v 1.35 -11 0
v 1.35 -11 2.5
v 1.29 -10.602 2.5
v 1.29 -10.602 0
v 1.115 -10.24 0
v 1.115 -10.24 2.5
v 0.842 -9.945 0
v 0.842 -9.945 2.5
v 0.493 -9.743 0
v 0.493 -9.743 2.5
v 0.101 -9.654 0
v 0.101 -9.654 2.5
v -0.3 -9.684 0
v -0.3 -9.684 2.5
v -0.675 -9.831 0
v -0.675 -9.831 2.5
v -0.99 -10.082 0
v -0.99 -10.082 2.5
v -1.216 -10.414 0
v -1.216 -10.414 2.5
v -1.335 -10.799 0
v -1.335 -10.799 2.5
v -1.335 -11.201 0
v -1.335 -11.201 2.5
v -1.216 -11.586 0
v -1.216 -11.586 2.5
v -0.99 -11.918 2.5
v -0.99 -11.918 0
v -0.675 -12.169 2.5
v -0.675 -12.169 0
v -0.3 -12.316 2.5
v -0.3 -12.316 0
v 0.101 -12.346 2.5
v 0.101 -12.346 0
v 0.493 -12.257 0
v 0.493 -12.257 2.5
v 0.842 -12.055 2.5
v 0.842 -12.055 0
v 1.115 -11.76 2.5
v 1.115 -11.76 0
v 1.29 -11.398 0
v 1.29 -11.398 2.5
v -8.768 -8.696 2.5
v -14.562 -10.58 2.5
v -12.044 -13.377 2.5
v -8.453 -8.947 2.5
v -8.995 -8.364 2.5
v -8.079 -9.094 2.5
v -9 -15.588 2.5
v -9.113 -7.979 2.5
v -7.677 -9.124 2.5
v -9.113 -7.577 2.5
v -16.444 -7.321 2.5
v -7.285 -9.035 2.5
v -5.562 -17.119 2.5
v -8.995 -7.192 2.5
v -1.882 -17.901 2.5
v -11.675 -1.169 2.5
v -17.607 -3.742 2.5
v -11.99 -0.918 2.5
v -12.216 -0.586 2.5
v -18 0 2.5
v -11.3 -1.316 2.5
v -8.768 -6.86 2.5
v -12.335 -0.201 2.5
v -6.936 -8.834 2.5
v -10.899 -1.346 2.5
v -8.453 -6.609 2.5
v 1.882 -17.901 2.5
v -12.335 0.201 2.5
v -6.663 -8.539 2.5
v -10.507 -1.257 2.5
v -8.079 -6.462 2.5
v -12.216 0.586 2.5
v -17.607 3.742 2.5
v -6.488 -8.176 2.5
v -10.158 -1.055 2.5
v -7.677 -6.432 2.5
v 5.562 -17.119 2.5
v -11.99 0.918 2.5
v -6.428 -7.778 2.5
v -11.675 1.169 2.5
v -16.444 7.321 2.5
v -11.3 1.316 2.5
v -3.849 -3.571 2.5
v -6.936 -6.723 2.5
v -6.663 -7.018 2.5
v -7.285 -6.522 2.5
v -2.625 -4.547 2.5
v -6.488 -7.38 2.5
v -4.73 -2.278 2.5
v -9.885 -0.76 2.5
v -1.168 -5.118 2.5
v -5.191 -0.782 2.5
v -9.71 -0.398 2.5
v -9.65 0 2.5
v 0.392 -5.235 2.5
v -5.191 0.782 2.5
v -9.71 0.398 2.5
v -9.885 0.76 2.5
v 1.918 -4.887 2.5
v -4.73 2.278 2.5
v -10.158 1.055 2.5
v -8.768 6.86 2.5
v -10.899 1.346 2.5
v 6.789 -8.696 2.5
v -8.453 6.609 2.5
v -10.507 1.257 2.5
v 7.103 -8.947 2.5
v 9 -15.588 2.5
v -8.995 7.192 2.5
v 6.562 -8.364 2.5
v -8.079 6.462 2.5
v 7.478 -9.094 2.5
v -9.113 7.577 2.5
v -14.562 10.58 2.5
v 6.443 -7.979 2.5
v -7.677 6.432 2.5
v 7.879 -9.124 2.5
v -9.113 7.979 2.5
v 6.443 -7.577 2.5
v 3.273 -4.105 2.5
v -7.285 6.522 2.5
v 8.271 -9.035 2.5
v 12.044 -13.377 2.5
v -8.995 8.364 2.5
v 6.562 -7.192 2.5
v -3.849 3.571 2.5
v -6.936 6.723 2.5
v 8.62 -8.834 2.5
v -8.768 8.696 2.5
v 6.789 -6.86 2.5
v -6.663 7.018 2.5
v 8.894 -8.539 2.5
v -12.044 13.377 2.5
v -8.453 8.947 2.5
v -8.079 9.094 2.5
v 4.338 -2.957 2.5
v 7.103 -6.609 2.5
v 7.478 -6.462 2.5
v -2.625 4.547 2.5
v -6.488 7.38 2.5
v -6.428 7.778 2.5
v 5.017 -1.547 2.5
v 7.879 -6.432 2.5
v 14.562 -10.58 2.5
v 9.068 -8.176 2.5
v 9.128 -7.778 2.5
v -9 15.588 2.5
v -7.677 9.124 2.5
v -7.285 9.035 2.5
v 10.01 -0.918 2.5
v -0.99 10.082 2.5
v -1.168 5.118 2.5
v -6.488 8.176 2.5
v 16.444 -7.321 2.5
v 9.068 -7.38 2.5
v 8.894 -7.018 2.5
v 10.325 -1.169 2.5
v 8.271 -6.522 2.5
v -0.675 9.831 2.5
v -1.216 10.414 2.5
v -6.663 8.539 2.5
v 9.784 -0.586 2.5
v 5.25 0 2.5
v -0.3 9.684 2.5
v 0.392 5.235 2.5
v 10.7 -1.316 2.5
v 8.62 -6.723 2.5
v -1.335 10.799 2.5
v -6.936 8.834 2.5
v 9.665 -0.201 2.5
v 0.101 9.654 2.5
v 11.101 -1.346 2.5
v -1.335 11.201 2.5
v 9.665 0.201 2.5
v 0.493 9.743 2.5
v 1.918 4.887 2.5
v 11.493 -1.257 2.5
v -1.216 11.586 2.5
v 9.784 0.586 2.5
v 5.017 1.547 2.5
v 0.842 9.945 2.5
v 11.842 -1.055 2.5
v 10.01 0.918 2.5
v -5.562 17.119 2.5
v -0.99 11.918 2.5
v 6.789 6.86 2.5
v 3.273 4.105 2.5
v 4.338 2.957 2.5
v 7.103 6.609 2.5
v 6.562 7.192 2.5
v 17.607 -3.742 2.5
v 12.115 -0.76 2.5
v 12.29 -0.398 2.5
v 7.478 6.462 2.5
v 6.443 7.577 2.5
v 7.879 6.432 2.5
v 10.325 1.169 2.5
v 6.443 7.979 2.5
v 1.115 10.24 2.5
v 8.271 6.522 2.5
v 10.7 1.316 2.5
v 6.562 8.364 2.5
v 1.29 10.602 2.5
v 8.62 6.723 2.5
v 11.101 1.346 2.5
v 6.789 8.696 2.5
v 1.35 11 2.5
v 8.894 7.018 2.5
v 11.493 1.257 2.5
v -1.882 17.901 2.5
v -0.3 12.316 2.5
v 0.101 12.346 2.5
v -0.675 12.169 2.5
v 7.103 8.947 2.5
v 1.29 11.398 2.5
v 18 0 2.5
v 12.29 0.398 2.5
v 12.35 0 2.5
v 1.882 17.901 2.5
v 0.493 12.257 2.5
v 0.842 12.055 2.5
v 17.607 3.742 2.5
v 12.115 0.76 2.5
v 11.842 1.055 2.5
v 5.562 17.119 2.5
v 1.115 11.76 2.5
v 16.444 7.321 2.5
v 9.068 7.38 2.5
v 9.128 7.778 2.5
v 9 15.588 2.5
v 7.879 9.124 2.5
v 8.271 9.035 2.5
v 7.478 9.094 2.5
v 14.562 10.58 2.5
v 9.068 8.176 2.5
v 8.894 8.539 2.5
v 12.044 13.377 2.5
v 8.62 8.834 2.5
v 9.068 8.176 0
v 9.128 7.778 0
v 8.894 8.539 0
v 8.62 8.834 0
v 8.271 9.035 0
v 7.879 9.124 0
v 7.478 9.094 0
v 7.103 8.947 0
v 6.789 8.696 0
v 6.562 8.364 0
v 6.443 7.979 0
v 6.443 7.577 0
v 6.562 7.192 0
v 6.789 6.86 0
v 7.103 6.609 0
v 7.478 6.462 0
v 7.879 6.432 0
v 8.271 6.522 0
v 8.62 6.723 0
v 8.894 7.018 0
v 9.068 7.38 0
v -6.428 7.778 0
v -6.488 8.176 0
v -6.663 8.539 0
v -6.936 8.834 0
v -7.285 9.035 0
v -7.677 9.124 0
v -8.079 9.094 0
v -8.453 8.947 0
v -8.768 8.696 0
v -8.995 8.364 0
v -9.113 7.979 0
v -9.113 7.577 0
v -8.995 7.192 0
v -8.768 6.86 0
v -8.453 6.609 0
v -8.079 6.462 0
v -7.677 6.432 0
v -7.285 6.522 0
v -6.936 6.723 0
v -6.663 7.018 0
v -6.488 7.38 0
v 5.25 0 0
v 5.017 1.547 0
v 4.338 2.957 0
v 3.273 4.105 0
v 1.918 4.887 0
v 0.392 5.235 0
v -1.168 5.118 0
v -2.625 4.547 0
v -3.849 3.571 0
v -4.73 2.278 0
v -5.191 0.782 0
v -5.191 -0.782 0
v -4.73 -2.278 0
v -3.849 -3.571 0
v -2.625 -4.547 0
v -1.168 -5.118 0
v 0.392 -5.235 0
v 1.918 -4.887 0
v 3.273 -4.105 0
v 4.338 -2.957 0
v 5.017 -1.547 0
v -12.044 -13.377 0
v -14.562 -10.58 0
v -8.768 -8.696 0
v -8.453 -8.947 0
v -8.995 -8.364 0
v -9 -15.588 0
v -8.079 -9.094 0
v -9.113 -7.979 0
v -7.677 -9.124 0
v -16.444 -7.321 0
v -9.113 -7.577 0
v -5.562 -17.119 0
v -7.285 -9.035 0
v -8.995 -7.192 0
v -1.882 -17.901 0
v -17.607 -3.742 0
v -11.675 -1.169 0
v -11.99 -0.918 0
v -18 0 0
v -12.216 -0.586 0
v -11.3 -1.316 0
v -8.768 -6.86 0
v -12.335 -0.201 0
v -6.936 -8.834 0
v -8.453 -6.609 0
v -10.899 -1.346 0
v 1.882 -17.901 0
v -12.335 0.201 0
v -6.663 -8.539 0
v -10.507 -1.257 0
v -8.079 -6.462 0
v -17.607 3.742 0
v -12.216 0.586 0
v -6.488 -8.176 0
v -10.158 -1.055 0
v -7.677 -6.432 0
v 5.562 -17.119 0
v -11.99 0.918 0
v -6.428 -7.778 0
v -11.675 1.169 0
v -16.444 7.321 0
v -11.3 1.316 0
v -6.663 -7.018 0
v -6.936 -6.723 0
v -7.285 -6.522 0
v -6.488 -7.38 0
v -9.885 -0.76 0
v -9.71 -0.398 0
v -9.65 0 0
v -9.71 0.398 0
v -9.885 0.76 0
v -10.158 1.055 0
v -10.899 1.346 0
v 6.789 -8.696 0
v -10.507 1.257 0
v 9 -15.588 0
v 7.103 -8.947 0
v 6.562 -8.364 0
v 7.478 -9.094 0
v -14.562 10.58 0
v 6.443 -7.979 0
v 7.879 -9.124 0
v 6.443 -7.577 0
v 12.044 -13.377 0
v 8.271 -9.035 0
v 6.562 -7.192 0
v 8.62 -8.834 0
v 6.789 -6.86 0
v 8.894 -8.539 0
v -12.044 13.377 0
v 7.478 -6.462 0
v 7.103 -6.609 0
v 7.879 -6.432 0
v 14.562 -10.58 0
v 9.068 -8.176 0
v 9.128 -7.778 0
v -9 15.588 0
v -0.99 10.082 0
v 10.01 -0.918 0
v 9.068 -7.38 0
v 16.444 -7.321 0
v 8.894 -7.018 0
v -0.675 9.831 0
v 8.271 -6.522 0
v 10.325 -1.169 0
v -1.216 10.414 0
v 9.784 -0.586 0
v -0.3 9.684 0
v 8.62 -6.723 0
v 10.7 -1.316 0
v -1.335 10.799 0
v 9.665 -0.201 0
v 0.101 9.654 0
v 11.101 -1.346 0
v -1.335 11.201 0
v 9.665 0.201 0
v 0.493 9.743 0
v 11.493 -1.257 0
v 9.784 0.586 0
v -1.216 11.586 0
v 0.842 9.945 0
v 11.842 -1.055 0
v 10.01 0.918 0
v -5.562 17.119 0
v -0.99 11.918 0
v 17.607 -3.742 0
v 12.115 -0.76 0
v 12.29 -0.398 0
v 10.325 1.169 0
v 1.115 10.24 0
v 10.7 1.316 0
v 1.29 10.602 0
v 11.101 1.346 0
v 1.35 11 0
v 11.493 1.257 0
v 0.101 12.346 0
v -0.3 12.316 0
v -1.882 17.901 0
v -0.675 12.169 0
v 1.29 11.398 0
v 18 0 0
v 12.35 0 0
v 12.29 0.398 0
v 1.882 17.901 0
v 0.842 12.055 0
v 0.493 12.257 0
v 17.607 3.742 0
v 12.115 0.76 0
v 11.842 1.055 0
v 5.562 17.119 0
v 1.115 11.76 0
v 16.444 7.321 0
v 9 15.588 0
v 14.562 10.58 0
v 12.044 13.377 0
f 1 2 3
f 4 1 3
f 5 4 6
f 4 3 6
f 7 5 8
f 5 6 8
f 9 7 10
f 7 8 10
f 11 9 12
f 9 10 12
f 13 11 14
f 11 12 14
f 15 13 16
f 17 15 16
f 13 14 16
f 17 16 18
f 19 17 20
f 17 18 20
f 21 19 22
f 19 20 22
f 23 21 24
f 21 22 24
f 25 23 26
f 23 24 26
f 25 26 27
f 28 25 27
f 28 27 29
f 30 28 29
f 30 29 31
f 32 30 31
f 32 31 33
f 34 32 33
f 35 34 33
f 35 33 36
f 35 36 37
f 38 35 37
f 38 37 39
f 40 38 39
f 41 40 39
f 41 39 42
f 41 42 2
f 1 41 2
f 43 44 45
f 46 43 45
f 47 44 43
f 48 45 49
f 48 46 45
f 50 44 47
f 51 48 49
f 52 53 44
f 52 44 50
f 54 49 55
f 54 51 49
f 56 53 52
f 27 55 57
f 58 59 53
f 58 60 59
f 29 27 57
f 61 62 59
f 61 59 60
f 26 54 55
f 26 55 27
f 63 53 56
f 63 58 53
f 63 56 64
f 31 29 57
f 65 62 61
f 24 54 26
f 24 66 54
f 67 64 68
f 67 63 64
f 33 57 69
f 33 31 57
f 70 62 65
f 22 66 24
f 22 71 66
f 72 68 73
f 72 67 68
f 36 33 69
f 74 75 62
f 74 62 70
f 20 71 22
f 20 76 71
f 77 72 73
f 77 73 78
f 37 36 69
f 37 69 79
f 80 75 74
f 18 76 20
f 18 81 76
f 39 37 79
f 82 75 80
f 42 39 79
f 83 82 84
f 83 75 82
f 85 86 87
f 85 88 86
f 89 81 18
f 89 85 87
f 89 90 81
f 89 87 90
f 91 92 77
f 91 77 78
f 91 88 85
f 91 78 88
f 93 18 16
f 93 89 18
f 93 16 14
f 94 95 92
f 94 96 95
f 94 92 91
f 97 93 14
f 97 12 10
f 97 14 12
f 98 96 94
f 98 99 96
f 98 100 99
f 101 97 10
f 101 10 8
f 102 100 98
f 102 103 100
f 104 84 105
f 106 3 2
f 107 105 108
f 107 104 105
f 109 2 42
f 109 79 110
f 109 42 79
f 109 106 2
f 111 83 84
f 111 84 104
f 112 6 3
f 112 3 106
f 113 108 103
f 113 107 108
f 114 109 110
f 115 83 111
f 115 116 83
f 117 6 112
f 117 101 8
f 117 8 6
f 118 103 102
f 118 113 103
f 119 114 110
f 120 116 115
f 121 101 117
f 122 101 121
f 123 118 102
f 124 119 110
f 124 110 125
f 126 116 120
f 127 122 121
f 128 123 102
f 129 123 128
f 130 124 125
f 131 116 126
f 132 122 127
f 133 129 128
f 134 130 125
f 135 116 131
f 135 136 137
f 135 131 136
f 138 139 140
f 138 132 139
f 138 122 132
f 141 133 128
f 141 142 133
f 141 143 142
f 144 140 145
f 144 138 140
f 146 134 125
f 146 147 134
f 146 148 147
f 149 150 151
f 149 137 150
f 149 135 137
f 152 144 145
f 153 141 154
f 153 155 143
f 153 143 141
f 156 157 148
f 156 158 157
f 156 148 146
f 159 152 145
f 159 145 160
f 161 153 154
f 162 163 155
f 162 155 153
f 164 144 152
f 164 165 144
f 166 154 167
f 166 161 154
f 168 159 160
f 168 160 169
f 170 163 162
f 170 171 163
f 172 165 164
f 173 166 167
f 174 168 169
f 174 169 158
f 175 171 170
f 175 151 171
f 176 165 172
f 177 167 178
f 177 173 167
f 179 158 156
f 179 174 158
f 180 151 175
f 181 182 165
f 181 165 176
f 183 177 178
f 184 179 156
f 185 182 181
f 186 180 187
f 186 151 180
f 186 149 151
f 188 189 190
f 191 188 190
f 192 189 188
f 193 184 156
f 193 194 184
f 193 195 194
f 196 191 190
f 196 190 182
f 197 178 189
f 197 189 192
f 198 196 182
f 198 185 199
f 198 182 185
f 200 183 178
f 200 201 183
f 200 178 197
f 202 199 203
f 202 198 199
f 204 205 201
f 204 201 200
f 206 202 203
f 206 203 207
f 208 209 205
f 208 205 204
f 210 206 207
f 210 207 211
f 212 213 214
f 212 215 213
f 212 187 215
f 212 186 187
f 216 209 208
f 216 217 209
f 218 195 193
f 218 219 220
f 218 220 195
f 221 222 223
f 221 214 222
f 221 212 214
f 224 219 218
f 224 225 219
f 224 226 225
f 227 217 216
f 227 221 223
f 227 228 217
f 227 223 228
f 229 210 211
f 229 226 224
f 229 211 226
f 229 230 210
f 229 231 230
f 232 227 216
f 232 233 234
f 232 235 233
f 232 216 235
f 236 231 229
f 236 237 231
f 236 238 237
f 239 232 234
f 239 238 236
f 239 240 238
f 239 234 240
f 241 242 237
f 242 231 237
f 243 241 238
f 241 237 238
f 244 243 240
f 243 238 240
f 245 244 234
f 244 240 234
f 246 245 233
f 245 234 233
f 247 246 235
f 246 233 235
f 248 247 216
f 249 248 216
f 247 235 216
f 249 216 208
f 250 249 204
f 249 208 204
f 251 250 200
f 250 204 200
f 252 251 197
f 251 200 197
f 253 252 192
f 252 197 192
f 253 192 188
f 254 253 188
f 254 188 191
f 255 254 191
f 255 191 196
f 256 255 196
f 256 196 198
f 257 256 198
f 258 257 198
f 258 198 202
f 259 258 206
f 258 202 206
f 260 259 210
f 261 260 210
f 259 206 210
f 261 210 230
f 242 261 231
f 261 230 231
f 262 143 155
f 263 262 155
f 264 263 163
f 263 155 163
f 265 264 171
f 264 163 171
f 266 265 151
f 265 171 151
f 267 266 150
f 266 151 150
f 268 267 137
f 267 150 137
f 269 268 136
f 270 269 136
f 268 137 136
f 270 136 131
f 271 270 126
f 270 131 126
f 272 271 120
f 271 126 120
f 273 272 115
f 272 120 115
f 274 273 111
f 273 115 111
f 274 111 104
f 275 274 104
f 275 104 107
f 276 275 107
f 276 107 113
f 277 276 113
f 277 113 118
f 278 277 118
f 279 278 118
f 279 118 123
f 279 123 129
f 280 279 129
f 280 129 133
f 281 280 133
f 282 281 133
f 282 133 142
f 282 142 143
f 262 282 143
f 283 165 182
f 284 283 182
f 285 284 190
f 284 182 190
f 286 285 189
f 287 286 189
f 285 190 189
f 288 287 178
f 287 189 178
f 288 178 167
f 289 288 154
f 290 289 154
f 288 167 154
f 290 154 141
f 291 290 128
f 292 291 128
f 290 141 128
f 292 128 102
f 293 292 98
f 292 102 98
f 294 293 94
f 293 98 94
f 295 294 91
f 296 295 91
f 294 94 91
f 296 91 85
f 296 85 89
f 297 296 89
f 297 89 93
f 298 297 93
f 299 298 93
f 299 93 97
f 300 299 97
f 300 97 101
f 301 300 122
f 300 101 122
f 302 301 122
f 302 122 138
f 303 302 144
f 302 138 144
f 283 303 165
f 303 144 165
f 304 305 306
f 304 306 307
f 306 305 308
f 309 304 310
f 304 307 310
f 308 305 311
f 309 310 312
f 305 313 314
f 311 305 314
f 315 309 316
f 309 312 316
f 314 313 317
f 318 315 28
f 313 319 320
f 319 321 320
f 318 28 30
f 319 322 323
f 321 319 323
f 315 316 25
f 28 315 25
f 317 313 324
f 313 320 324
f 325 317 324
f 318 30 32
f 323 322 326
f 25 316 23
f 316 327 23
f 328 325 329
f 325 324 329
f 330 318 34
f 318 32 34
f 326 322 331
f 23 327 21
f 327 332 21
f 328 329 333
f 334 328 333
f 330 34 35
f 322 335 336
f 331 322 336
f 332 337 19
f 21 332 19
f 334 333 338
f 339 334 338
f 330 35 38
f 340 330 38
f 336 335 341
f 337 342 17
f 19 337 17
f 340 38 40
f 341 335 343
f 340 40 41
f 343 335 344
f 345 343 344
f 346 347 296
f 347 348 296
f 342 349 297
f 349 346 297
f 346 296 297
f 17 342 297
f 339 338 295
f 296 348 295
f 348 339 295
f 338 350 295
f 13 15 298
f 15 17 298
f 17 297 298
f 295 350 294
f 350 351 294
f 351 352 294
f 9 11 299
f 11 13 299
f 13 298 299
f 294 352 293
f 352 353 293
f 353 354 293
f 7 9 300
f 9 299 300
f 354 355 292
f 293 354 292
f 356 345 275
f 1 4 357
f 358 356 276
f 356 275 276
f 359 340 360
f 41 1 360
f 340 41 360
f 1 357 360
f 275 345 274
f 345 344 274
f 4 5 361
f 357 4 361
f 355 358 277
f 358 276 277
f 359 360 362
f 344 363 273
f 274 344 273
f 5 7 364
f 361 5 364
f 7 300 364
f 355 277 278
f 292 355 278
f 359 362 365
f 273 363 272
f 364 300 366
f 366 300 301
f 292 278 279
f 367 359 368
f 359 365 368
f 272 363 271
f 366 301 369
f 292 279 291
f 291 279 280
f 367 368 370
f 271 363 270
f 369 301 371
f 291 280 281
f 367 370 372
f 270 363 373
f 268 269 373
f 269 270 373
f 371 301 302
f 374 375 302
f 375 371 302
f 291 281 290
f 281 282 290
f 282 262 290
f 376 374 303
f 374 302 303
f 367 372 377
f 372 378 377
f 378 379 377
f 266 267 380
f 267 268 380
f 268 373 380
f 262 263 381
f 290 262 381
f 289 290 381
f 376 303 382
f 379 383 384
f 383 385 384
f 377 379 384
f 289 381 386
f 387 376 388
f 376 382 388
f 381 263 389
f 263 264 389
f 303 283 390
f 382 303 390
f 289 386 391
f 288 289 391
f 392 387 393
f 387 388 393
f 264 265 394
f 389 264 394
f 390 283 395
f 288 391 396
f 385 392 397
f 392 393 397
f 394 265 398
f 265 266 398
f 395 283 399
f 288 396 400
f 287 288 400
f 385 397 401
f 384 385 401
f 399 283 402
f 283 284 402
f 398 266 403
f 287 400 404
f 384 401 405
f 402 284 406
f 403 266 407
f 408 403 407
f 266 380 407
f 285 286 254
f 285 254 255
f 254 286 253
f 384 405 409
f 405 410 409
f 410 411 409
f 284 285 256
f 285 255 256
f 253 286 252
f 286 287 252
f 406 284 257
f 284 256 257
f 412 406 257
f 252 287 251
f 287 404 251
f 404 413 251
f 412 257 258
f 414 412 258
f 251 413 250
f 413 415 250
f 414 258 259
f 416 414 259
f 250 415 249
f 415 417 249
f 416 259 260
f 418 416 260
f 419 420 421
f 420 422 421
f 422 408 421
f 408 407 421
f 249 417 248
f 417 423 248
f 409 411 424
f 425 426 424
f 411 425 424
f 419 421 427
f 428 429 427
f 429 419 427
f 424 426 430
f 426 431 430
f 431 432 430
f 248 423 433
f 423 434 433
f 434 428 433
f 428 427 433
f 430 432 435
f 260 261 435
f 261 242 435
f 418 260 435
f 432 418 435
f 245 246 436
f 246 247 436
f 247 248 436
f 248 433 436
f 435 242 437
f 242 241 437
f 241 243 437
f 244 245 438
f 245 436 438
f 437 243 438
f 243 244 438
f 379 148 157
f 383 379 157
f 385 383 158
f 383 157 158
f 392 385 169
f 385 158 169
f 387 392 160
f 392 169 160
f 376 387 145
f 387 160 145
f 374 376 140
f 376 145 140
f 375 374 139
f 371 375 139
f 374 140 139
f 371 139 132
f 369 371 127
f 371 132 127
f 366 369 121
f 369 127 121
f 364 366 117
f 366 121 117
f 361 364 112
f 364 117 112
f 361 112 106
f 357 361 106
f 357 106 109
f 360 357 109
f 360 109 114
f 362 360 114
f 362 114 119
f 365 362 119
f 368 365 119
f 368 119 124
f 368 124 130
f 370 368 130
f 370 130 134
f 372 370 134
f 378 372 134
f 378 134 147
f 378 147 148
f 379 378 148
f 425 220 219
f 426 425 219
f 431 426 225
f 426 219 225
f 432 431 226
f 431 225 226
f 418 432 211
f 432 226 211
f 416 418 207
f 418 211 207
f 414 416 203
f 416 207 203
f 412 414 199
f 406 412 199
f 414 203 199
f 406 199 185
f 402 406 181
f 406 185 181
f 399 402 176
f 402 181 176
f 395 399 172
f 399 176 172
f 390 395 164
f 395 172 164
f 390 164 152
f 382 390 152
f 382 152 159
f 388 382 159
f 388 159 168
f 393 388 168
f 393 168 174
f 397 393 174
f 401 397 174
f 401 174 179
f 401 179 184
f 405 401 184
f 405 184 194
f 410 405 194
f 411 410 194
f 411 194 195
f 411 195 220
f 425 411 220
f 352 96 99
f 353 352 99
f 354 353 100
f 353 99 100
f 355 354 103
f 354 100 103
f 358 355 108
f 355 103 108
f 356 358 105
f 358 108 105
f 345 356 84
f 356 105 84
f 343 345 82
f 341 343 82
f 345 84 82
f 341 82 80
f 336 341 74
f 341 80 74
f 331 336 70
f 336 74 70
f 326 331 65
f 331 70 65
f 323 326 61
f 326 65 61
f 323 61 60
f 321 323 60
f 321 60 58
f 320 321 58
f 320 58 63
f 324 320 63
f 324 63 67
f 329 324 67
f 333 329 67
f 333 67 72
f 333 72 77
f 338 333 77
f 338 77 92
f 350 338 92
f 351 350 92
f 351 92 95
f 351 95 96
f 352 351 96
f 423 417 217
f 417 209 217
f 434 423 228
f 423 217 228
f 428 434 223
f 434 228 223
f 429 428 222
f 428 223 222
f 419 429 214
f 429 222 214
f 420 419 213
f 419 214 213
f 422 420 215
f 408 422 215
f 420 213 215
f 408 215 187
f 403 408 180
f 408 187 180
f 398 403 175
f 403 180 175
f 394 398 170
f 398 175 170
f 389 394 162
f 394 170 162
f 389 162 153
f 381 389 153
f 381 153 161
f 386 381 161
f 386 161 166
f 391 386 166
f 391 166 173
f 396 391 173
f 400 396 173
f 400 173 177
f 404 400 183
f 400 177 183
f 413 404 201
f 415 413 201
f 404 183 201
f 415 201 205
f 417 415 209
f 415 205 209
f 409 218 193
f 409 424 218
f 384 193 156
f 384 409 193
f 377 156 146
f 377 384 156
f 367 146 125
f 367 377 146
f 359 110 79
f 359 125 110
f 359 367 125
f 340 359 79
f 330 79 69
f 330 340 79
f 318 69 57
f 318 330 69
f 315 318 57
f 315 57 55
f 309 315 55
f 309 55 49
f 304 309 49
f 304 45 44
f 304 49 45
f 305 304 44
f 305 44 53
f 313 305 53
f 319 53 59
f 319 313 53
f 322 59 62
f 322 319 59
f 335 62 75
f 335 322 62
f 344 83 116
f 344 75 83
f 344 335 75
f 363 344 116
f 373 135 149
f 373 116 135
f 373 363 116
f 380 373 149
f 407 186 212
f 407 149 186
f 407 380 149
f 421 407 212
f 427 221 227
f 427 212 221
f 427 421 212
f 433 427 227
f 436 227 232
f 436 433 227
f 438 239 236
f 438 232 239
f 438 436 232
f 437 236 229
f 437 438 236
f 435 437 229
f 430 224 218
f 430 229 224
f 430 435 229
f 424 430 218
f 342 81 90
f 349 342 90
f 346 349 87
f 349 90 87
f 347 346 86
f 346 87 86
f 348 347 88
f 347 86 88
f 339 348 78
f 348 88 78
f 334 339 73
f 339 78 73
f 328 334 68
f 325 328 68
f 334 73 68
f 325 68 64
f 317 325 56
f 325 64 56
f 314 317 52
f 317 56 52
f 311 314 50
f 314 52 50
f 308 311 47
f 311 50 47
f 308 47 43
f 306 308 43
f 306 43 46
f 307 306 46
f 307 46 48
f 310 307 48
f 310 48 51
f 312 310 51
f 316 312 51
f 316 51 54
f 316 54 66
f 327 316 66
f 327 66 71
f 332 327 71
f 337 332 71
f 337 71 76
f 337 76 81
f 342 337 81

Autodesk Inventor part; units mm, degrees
ref_plane "YZ Plane" through (0, 0, 0) normal (1, 0, 0) x (0, 1, 0)
ref_plane "XZ Plane" through (0, 0, 0) normal (0, 1, 0) x (-1, 0, 0)
ref_plane "XY Plane" through (0, 0, 0) normal (0, 0, 1) x (1, 0, 0)
sketch "Sketch1" plane through (0, 0, 0) normal (0, 0, 1) x (1, 0, 0)
  circle A0 centre (0, 0) radius 18
  dimension "d0" = 36
extrude "Extrusion1" add sketch "Sketch1" along normal blind 2.5
sketch "Sketch2" plane through (0, 0, 2.5) normal (0, 0, 1) x (1, 0, 0)
  line L0 (0, 0) -> (0, 11)
  circle A0 centre (0, 11) radius 1.25
  circle A1 centre (0, 0) radius 5
  circle A2 centre (7.7782, 7.7782) radius 1.25
  circle A3 centre (11, 0) radius 1.25
  circle A4 centre (7.7782, -7.7782) radius 1.25
  circle A5 centre (0, -11) radius 1.25
  circle A6 centre (-7.7782, -7.7782) radius 1.25
  circle A7 centre (-11, 0) radius 1.25
  circle A8 centre (-7.7782, 7.7782) radius 1.25
  dimension "d3" = 11
  dimension "d4" = 2.5
  dimension "d5" = 10
  dimension "d8" = 360
extrude "Extrusion2" cut sketch "Sketch2" against normal through all
sketch "Sketch3" plane through (0, 0, 2.5) normal (0, 0, 1) x (1, 0, 0)
  circle A0 centre (0, 0) radius 5.25
  dimension "d12" = 10.5
extrude "Extrusion3" cut sketch "Sketch3" against normal through all
sketch "Sketch4" plane through (0, 0, 2.5) normal (0, 0, 1) x (1, 0, 0)
  circle A0 centre (0, 11) radius 1.25 projected
  circle A1 centre (0, 11) radius 1.35
  circle A2 centre (7.7782, 7.7782) radius 1.25 projected
  circle A3 centre (7.7782, 7.7782) radius 1.35
  circle A4 centre (11, 0) radius 1.25 projected
  circle A5 centre (11, 0) radius 1.35
  circle A6 centre (-7.7782, 7.7782) radius 1.25 projected
  circle A7 centre (-7.7782, 7.7782) radius 1.35
  circle A8 centre (-11, 0) radius 1.25 projected
  circle A9 centre (-11, 0) radius 1.35
  circle A10 centre (-7.7782, -7.7782) radius 1.25 projected
  circle A11 centre (-7.7782, -7.7782) radius 1.35
  circle A12 centre (0, -11) radius 1.25 projected
  circle A13 centre (0, -11) radius 1.35
  circle A14 centre (7.7782, -7.7782) radius 1.25 projected
  circle A15 centre (7.7782, -7.7782) radius 1.35
  point P0 (0, 0)
  dimension "d15" = 2.7
  dimension "d16" = 2.7
  dimension "d17" = 2.7
  dimension "d18" = 2.7
  dimension "d19" = 2.7
  dimension "d20" = 2.7
  dimension "d21" = 2.7
  dimension "d22" = 2.7
extrude "Extrusion4" cut sketch "Sketch4" against normal blind 10
properties part number "Pulley_base"
